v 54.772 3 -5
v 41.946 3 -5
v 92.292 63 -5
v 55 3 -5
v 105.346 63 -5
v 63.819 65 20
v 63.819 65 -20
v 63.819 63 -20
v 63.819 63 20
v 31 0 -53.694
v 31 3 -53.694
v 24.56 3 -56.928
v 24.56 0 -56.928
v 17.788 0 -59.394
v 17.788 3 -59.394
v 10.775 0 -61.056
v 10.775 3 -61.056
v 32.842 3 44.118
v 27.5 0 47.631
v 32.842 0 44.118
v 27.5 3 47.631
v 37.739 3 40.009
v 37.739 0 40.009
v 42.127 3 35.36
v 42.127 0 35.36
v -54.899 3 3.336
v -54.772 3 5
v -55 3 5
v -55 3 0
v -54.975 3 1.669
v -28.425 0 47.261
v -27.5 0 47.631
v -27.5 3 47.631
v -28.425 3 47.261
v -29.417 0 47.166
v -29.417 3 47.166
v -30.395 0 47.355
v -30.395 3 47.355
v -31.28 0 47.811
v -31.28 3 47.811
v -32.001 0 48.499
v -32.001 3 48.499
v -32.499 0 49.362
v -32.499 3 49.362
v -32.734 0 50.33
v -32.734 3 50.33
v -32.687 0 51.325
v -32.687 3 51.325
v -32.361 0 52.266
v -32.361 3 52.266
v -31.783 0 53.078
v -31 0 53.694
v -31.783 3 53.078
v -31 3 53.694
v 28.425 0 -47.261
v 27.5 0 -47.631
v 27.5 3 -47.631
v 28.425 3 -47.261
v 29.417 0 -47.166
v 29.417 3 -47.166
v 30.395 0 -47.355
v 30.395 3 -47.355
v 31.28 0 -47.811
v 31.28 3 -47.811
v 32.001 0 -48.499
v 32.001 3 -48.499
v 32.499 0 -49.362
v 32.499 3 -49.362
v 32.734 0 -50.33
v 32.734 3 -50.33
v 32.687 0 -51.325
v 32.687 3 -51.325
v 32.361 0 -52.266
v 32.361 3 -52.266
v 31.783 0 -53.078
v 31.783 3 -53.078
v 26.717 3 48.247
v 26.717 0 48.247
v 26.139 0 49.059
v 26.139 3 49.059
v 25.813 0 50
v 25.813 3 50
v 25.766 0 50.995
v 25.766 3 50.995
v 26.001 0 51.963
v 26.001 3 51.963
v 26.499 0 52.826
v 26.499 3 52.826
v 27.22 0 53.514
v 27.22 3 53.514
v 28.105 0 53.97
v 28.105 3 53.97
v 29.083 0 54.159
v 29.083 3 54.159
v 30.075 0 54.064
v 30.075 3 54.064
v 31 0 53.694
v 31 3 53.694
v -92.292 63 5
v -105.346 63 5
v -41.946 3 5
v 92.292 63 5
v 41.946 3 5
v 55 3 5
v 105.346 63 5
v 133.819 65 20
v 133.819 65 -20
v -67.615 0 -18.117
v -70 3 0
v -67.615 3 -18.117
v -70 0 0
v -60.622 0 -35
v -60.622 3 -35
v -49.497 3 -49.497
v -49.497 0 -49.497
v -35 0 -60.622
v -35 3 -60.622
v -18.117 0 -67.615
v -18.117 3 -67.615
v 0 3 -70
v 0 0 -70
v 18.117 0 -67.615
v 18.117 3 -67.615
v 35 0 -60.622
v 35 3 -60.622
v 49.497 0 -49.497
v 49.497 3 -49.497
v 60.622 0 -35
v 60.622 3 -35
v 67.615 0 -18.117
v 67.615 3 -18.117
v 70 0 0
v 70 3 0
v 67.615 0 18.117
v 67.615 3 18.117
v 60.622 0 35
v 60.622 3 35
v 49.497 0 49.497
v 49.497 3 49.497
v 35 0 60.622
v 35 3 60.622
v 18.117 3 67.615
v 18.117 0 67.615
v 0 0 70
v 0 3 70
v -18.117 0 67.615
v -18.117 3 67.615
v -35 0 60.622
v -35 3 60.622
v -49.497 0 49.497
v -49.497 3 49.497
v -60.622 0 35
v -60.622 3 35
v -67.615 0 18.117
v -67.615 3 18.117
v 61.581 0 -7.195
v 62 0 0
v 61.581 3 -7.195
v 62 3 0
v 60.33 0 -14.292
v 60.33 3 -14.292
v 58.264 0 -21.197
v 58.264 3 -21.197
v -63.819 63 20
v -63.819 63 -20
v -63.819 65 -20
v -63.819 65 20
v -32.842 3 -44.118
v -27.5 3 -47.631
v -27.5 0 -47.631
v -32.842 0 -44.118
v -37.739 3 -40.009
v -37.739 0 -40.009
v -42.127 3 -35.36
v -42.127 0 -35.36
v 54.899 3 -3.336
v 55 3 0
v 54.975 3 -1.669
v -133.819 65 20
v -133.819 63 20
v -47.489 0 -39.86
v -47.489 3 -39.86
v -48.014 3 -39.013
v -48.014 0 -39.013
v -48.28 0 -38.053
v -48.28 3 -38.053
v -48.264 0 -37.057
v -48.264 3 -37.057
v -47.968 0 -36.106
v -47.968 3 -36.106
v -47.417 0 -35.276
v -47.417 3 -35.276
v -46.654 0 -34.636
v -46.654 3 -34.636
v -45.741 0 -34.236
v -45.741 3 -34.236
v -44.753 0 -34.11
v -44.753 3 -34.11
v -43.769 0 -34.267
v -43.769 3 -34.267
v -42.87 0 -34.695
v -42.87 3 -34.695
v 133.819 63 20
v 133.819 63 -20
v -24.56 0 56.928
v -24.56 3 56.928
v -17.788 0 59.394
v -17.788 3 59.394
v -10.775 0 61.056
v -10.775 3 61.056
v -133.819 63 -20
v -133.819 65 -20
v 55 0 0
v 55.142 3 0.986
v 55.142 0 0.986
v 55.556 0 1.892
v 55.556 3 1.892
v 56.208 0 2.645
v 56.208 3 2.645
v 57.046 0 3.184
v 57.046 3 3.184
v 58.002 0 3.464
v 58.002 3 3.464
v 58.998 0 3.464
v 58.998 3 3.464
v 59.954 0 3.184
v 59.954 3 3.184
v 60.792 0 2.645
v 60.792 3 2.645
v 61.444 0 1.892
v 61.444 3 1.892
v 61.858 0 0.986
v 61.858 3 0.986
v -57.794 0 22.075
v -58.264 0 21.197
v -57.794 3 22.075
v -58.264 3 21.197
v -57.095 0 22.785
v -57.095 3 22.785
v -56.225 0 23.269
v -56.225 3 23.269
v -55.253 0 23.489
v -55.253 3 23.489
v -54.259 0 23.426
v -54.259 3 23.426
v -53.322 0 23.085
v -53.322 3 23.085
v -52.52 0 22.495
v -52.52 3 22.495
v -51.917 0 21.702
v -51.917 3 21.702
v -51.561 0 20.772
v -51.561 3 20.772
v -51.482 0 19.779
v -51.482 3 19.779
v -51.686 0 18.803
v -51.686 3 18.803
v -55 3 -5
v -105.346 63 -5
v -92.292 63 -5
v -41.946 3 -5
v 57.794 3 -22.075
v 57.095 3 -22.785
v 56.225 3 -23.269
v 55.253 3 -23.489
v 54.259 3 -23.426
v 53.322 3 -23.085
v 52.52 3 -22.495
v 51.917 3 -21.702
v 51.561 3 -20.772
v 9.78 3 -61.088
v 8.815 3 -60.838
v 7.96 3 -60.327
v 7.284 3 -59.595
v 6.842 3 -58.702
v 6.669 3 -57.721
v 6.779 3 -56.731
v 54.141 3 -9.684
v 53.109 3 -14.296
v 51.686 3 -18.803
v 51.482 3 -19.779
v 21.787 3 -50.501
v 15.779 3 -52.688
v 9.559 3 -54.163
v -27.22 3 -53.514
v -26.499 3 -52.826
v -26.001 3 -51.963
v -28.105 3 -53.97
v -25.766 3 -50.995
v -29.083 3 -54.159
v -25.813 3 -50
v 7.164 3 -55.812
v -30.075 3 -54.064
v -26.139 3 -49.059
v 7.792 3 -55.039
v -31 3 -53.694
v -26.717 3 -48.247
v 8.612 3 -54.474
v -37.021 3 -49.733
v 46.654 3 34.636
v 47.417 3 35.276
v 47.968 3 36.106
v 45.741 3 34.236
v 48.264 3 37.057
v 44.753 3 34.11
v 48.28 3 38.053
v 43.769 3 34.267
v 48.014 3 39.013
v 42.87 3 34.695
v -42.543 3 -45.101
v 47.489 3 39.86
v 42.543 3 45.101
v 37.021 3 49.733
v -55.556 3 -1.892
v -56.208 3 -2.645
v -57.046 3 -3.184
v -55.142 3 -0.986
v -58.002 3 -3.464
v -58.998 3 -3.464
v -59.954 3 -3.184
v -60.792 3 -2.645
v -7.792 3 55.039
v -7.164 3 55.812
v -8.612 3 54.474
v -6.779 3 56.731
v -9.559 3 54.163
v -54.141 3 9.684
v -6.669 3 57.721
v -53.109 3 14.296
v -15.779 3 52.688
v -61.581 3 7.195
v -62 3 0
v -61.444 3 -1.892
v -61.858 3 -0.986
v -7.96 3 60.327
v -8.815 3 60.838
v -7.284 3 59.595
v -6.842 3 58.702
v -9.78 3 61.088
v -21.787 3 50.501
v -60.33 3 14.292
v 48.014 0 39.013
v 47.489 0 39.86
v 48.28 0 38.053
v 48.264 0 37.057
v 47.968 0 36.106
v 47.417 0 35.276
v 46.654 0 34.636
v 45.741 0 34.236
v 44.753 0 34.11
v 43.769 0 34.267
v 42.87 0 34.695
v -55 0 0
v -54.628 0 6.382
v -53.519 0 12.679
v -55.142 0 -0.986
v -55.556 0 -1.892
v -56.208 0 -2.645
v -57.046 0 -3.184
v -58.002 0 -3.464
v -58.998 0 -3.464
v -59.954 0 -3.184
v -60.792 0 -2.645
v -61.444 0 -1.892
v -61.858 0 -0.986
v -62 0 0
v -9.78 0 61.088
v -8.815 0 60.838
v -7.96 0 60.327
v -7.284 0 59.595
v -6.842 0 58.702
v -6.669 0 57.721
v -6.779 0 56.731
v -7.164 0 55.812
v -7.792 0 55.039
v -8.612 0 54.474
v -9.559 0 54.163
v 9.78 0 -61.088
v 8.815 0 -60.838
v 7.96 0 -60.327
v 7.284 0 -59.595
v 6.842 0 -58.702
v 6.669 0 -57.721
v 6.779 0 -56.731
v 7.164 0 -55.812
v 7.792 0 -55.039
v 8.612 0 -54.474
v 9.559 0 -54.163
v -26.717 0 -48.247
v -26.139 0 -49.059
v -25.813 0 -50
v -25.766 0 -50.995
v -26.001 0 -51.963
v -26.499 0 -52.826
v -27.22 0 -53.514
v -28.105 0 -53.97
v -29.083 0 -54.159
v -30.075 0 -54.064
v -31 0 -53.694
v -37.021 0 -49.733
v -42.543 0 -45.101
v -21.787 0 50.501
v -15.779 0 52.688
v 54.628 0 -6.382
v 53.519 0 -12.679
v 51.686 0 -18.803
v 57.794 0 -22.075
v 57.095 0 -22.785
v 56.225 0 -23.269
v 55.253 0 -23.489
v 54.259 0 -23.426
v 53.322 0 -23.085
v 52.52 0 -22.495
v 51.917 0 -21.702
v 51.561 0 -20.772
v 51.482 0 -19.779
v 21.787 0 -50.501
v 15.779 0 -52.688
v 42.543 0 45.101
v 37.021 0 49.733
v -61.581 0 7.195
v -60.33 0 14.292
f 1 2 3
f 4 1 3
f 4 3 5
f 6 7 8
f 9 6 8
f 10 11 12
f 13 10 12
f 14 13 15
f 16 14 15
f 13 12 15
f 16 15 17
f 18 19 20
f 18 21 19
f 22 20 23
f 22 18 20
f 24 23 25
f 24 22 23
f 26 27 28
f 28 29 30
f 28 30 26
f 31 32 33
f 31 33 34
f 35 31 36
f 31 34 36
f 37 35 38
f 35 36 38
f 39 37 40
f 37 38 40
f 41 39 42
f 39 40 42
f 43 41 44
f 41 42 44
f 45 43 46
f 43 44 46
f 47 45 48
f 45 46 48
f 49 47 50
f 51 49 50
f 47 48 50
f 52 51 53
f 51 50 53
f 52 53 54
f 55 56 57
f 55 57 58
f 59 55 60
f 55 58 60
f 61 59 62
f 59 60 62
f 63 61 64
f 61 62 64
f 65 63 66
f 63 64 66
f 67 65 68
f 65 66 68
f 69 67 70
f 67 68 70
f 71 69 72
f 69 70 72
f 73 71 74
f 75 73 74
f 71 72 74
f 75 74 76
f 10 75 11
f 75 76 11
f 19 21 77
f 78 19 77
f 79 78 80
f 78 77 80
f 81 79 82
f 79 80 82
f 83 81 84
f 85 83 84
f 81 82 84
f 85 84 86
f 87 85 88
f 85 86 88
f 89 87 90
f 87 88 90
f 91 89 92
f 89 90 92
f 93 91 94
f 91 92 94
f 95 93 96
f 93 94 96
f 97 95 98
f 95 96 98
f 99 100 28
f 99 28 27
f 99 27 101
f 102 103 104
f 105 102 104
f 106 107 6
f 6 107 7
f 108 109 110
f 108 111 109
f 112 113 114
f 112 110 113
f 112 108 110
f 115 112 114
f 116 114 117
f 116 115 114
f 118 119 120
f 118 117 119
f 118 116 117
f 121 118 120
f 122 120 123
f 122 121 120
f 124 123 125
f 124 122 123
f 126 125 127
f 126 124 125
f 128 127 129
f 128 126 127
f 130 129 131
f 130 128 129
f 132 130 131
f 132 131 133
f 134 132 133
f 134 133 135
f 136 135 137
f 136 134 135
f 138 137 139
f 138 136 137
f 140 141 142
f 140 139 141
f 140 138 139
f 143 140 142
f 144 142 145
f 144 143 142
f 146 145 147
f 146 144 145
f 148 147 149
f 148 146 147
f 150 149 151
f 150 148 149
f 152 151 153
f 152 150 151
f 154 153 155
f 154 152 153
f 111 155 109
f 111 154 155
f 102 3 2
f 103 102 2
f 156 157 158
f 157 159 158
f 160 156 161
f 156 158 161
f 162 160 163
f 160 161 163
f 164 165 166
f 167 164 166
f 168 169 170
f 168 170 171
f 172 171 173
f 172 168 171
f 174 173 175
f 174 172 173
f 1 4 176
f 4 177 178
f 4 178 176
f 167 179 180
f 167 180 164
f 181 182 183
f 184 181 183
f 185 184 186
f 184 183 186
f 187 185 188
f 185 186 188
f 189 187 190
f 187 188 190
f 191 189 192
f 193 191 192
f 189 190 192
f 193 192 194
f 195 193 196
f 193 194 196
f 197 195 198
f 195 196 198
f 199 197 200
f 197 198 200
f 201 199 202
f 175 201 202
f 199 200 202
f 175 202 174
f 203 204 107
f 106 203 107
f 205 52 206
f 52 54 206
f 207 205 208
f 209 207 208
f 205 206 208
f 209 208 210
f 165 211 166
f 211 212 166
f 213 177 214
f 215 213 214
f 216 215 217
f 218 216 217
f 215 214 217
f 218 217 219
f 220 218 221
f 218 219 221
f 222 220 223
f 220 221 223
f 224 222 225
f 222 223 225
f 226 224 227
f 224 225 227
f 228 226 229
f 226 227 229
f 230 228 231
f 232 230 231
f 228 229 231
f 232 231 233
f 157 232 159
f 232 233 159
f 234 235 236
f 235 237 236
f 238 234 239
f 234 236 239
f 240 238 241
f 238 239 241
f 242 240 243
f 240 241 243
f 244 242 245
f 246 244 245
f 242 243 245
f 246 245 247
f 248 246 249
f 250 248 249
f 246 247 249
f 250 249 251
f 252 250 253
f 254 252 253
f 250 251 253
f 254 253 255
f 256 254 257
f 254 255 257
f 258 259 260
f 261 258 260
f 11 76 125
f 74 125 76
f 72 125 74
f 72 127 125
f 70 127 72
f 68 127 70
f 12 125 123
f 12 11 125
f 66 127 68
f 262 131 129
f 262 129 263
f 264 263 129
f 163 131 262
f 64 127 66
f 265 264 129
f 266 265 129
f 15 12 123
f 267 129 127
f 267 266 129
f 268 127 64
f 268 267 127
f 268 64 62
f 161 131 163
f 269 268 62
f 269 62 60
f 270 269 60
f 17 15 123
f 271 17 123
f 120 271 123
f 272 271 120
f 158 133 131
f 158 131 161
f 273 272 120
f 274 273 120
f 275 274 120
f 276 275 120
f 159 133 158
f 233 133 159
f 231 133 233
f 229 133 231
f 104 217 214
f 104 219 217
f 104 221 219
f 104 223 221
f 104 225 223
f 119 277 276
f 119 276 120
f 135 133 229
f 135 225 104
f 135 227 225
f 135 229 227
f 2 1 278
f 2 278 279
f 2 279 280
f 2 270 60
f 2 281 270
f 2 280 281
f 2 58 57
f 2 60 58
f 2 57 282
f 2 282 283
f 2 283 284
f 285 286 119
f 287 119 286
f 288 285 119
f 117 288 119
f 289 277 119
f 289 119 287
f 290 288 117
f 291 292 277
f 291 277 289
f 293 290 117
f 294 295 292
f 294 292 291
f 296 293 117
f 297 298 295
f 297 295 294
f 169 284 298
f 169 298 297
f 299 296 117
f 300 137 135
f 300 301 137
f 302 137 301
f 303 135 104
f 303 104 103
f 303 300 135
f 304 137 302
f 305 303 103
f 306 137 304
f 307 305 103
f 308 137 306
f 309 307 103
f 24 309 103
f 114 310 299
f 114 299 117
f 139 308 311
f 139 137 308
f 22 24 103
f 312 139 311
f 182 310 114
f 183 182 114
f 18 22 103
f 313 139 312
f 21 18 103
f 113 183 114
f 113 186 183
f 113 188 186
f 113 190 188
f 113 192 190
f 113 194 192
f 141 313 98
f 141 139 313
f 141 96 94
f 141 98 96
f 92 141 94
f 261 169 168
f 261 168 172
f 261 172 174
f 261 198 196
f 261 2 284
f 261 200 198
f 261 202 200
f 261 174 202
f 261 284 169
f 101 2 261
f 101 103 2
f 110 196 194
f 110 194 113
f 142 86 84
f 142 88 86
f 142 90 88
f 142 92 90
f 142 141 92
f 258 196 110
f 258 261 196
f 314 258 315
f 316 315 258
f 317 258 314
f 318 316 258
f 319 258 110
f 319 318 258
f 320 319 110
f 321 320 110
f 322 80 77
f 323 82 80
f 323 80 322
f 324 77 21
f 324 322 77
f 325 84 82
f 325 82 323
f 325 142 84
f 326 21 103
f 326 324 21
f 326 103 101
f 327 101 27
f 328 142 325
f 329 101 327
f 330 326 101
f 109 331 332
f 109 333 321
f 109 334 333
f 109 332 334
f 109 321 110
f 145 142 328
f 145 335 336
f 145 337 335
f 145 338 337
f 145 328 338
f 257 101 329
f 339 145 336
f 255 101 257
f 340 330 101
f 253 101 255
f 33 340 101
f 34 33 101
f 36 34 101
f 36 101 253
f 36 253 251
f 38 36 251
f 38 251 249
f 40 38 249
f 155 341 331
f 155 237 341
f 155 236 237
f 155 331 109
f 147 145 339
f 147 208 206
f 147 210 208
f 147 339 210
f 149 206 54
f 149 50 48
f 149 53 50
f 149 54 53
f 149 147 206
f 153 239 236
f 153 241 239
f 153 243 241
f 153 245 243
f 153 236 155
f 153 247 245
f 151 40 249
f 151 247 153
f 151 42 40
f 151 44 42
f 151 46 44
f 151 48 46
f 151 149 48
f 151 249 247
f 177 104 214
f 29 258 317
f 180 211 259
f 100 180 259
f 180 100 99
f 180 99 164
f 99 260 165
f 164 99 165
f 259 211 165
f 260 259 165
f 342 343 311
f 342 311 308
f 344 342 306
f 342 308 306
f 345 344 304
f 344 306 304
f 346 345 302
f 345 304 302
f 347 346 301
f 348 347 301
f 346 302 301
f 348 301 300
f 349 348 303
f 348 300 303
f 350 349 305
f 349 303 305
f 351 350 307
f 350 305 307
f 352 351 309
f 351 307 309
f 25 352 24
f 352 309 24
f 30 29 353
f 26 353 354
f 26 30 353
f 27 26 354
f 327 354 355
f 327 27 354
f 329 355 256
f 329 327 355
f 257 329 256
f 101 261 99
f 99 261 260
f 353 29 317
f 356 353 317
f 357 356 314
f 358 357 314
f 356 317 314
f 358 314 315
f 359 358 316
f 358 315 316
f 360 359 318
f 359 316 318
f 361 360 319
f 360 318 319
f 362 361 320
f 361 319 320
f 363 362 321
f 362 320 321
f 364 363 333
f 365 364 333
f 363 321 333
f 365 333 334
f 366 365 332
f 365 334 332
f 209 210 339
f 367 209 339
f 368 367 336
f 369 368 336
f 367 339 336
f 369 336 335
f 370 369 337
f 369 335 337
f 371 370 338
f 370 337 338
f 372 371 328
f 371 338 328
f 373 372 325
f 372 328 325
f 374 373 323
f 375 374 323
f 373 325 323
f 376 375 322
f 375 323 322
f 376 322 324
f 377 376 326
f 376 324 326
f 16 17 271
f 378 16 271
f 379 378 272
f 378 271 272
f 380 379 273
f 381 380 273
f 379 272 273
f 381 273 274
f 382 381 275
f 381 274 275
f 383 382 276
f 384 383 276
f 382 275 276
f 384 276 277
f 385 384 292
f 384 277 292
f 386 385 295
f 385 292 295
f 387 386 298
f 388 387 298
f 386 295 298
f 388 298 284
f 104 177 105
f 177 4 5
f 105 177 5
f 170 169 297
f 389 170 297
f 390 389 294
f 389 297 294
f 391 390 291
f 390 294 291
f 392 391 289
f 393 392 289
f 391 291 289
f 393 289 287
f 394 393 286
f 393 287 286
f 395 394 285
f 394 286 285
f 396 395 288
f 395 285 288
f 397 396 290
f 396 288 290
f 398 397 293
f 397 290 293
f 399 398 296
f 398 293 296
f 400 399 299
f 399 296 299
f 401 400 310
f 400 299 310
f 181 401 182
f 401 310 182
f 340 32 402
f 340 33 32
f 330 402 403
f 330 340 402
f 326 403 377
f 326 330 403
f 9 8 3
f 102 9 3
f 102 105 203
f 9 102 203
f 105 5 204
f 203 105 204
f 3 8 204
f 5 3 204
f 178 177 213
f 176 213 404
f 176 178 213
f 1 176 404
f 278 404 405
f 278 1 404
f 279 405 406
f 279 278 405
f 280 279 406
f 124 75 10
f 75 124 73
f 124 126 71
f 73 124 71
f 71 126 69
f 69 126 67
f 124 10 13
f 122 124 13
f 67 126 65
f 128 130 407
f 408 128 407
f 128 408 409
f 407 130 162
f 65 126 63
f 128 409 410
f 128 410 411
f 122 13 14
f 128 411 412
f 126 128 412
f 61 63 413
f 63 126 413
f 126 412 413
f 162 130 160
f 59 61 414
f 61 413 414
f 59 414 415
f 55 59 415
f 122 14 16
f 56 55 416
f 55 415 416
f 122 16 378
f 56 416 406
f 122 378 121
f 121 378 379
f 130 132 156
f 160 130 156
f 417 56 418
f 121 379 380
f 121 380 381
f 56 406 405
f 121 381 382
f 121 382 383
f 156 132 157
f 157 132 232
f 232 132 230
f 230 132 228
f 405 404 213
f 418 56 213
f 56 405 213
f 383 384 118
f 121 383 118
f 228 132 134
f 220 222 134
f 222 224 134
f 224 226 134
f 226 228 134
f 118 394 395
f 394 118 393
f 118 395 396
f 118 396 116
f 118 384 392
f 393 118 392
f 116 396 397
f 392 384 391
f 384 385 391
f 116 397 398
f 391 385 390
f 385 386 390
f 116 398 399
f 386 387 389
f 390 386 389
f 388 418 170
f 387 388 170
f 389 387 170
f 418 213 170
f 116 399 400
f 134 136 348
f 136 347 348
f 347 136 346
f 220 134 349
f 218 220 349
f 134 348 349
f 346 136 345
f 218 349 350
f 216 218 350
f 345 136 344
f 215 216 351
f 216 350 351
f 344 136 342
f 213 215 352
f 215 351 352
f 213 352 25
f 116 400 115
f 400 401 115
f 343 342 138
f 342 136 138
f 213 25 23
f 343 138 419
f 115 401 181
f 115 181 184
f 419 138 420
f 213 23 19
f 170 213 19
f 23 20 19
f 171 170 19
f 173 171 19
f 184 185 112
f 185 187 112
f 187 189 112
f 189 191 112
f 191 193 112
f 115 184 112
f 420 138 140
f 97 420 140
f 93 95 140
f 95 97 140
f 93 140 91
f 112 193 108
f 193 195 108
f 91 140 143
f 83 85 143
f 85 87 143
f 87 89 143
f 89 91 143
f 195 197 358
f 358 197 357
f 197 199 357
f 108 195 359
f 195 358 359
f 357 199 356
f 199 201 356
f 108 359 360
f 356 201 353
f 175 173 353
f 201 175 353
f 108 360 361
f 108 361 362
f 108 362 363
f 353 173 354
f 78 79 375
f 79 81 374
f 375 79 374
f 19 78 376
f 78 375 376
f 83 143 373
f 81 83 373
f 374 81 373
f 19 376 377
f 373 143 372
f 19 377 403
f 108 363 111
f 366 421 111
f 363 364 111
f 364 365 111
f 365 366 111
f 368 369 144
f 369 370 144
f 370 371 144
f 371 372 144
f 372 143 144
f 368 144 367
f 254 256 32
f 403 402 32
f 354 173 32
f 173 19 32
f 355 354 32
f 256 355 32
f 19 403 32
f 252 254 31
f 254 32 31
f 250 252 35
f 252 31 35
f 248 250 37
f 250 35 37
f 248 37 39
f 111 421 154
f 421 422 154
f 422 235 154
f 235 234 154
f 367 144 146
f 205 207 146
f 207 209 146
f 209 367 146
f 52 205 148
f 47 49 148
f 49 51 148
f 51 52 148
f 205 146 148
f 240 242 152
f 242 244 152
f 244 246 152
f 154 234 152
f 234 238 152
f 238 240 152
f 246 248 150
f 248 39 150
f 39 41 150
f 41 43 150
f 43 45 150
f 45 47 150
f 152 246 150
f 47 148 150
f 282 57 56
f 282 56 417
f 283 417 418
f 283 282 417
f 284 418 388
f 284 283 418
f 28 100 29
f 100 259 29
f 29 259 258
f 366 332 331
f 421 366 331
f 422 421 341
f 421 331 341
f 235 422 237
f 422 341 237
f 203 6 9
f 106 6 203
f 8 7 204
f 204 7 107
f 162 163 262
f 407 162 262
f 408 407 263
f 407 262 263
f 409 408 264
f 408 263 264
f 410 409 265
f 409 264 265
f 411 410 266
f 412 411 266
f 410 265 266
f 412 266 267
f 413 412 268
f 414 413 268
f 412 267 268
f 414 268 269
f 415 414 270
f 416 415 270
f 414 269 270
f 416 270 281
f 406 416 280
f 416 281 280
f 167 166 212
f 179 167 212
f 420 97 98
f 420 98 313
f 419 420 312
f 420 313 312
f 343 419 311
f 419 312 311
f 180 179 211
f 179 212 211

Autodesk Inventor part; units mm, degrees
ref_plane "YZ Plane" through (0, 0, 0) normal (1, 0, 0) x (0, 1, 0)
ref_plane "XZ Plane" through (0, 0, 0) normal (0, 1, 0) x (-1, 0, 0)
ref_plane "XY Plane" through (0, 0, 0) normal (0, 0, 1) x (1, 0, 0)
sketch "Sketch1" plane through (0, 0, 0) normal (0, 1, 0) x (-1, 0, 0)
  circle A0 centre (0, 0) radius 70
  dimension "d0" = 140
extrude "Extrusion1" add sketch "Sketch1" along normal blind 3
sketch "Sketch2" plane through (0, 3, 0) normal (0, 1, 0) x (1, 0, 0)
  circle A0 centre (0, 0) radius 62
  circle A1 centre (0, 0) radius 55
  arc A2 (-55, 0) -> (-62, 0) centre (-58.5, 0) ccw
  arc A3 (-58.2641, -21.1966) -> (-51.6859, -18.8034) centre (-54.975, -20) ccw
  dimension "d3" = 124
  dimension "d4" = 110
  dimension "d7" = 20
extrude "Extrusion2" cut sketch "Sketch2" against normal through all contours A2 A1 A3 A0 picked at (-56.7601, -18.0974)
pattern_circular "Circular Pattern1" count 6 over 360 about axis through (0, 0, 0) along (0, 1, 0) of "Extrusion2"
sketch "Sketch4" plane through (0, 0, 0) normal (0, 0, 1) x (1, 0, 0)
  line L0 (70, 3) -> (-70, 3) projected
  line L1 (-41.9459, 3) -> (-92.2919, 63)
  line L2 (-92.2919, 63) -> (-105.346, 63)
  line L3 (-105.346, 63) -> (-55, 3)
  point P0 (0, 0)
  point P1 (0, 3)
  dimension "d13" = 50
  dimension "d14" = 60
  dimension "d15" = 55
  dimension "d16" = 10
extrude "Extrusion3" add sketch "Sketch4" along normal mid plane 10
mirror "Mirror1" about plane through (0, 0, 0) normal (1, 0, 0) of "Extrusion3"
sketch "Sketch6" plane through (0, 0, 0) normal (0, 0, 1) x (1, 0, 0)
  line L0 (-63.8189, 65) -> (-133.8189, 65)
  line L1 (-133.8189, 65) -> (-133.8189, 63)
  line L2 (-133.8189, 63) -> (-63.8189, 63)
  line L3 (-63.8189, 63) -> (-63.8189, 65)
  line L4 (-63.8189, 65) -> (-133.8189, 63) construction
  line L5 (-133.8189, 65) -> (-63.8189, 63) construction
  line L6 (-105.346, 63) -> (-92.2919, 63) projected
  point P0 (0, 0)
  point P1 (-98.8189, 64)
  point P2 (-98.8189, 63)
  point P3 (-98.8189, 63)
  dimension "d22" = 2
  dimension "d23" = 70
  dimension "d24" = 0
extrude "Extrusion4" add sketch "Sketch6" along normal mid plane 40
mirror "Mirror2" about plane through (0, 0, 0) normal (1, 0, 0) of "Extrusion4"
properties part number "Bottom_plate"
